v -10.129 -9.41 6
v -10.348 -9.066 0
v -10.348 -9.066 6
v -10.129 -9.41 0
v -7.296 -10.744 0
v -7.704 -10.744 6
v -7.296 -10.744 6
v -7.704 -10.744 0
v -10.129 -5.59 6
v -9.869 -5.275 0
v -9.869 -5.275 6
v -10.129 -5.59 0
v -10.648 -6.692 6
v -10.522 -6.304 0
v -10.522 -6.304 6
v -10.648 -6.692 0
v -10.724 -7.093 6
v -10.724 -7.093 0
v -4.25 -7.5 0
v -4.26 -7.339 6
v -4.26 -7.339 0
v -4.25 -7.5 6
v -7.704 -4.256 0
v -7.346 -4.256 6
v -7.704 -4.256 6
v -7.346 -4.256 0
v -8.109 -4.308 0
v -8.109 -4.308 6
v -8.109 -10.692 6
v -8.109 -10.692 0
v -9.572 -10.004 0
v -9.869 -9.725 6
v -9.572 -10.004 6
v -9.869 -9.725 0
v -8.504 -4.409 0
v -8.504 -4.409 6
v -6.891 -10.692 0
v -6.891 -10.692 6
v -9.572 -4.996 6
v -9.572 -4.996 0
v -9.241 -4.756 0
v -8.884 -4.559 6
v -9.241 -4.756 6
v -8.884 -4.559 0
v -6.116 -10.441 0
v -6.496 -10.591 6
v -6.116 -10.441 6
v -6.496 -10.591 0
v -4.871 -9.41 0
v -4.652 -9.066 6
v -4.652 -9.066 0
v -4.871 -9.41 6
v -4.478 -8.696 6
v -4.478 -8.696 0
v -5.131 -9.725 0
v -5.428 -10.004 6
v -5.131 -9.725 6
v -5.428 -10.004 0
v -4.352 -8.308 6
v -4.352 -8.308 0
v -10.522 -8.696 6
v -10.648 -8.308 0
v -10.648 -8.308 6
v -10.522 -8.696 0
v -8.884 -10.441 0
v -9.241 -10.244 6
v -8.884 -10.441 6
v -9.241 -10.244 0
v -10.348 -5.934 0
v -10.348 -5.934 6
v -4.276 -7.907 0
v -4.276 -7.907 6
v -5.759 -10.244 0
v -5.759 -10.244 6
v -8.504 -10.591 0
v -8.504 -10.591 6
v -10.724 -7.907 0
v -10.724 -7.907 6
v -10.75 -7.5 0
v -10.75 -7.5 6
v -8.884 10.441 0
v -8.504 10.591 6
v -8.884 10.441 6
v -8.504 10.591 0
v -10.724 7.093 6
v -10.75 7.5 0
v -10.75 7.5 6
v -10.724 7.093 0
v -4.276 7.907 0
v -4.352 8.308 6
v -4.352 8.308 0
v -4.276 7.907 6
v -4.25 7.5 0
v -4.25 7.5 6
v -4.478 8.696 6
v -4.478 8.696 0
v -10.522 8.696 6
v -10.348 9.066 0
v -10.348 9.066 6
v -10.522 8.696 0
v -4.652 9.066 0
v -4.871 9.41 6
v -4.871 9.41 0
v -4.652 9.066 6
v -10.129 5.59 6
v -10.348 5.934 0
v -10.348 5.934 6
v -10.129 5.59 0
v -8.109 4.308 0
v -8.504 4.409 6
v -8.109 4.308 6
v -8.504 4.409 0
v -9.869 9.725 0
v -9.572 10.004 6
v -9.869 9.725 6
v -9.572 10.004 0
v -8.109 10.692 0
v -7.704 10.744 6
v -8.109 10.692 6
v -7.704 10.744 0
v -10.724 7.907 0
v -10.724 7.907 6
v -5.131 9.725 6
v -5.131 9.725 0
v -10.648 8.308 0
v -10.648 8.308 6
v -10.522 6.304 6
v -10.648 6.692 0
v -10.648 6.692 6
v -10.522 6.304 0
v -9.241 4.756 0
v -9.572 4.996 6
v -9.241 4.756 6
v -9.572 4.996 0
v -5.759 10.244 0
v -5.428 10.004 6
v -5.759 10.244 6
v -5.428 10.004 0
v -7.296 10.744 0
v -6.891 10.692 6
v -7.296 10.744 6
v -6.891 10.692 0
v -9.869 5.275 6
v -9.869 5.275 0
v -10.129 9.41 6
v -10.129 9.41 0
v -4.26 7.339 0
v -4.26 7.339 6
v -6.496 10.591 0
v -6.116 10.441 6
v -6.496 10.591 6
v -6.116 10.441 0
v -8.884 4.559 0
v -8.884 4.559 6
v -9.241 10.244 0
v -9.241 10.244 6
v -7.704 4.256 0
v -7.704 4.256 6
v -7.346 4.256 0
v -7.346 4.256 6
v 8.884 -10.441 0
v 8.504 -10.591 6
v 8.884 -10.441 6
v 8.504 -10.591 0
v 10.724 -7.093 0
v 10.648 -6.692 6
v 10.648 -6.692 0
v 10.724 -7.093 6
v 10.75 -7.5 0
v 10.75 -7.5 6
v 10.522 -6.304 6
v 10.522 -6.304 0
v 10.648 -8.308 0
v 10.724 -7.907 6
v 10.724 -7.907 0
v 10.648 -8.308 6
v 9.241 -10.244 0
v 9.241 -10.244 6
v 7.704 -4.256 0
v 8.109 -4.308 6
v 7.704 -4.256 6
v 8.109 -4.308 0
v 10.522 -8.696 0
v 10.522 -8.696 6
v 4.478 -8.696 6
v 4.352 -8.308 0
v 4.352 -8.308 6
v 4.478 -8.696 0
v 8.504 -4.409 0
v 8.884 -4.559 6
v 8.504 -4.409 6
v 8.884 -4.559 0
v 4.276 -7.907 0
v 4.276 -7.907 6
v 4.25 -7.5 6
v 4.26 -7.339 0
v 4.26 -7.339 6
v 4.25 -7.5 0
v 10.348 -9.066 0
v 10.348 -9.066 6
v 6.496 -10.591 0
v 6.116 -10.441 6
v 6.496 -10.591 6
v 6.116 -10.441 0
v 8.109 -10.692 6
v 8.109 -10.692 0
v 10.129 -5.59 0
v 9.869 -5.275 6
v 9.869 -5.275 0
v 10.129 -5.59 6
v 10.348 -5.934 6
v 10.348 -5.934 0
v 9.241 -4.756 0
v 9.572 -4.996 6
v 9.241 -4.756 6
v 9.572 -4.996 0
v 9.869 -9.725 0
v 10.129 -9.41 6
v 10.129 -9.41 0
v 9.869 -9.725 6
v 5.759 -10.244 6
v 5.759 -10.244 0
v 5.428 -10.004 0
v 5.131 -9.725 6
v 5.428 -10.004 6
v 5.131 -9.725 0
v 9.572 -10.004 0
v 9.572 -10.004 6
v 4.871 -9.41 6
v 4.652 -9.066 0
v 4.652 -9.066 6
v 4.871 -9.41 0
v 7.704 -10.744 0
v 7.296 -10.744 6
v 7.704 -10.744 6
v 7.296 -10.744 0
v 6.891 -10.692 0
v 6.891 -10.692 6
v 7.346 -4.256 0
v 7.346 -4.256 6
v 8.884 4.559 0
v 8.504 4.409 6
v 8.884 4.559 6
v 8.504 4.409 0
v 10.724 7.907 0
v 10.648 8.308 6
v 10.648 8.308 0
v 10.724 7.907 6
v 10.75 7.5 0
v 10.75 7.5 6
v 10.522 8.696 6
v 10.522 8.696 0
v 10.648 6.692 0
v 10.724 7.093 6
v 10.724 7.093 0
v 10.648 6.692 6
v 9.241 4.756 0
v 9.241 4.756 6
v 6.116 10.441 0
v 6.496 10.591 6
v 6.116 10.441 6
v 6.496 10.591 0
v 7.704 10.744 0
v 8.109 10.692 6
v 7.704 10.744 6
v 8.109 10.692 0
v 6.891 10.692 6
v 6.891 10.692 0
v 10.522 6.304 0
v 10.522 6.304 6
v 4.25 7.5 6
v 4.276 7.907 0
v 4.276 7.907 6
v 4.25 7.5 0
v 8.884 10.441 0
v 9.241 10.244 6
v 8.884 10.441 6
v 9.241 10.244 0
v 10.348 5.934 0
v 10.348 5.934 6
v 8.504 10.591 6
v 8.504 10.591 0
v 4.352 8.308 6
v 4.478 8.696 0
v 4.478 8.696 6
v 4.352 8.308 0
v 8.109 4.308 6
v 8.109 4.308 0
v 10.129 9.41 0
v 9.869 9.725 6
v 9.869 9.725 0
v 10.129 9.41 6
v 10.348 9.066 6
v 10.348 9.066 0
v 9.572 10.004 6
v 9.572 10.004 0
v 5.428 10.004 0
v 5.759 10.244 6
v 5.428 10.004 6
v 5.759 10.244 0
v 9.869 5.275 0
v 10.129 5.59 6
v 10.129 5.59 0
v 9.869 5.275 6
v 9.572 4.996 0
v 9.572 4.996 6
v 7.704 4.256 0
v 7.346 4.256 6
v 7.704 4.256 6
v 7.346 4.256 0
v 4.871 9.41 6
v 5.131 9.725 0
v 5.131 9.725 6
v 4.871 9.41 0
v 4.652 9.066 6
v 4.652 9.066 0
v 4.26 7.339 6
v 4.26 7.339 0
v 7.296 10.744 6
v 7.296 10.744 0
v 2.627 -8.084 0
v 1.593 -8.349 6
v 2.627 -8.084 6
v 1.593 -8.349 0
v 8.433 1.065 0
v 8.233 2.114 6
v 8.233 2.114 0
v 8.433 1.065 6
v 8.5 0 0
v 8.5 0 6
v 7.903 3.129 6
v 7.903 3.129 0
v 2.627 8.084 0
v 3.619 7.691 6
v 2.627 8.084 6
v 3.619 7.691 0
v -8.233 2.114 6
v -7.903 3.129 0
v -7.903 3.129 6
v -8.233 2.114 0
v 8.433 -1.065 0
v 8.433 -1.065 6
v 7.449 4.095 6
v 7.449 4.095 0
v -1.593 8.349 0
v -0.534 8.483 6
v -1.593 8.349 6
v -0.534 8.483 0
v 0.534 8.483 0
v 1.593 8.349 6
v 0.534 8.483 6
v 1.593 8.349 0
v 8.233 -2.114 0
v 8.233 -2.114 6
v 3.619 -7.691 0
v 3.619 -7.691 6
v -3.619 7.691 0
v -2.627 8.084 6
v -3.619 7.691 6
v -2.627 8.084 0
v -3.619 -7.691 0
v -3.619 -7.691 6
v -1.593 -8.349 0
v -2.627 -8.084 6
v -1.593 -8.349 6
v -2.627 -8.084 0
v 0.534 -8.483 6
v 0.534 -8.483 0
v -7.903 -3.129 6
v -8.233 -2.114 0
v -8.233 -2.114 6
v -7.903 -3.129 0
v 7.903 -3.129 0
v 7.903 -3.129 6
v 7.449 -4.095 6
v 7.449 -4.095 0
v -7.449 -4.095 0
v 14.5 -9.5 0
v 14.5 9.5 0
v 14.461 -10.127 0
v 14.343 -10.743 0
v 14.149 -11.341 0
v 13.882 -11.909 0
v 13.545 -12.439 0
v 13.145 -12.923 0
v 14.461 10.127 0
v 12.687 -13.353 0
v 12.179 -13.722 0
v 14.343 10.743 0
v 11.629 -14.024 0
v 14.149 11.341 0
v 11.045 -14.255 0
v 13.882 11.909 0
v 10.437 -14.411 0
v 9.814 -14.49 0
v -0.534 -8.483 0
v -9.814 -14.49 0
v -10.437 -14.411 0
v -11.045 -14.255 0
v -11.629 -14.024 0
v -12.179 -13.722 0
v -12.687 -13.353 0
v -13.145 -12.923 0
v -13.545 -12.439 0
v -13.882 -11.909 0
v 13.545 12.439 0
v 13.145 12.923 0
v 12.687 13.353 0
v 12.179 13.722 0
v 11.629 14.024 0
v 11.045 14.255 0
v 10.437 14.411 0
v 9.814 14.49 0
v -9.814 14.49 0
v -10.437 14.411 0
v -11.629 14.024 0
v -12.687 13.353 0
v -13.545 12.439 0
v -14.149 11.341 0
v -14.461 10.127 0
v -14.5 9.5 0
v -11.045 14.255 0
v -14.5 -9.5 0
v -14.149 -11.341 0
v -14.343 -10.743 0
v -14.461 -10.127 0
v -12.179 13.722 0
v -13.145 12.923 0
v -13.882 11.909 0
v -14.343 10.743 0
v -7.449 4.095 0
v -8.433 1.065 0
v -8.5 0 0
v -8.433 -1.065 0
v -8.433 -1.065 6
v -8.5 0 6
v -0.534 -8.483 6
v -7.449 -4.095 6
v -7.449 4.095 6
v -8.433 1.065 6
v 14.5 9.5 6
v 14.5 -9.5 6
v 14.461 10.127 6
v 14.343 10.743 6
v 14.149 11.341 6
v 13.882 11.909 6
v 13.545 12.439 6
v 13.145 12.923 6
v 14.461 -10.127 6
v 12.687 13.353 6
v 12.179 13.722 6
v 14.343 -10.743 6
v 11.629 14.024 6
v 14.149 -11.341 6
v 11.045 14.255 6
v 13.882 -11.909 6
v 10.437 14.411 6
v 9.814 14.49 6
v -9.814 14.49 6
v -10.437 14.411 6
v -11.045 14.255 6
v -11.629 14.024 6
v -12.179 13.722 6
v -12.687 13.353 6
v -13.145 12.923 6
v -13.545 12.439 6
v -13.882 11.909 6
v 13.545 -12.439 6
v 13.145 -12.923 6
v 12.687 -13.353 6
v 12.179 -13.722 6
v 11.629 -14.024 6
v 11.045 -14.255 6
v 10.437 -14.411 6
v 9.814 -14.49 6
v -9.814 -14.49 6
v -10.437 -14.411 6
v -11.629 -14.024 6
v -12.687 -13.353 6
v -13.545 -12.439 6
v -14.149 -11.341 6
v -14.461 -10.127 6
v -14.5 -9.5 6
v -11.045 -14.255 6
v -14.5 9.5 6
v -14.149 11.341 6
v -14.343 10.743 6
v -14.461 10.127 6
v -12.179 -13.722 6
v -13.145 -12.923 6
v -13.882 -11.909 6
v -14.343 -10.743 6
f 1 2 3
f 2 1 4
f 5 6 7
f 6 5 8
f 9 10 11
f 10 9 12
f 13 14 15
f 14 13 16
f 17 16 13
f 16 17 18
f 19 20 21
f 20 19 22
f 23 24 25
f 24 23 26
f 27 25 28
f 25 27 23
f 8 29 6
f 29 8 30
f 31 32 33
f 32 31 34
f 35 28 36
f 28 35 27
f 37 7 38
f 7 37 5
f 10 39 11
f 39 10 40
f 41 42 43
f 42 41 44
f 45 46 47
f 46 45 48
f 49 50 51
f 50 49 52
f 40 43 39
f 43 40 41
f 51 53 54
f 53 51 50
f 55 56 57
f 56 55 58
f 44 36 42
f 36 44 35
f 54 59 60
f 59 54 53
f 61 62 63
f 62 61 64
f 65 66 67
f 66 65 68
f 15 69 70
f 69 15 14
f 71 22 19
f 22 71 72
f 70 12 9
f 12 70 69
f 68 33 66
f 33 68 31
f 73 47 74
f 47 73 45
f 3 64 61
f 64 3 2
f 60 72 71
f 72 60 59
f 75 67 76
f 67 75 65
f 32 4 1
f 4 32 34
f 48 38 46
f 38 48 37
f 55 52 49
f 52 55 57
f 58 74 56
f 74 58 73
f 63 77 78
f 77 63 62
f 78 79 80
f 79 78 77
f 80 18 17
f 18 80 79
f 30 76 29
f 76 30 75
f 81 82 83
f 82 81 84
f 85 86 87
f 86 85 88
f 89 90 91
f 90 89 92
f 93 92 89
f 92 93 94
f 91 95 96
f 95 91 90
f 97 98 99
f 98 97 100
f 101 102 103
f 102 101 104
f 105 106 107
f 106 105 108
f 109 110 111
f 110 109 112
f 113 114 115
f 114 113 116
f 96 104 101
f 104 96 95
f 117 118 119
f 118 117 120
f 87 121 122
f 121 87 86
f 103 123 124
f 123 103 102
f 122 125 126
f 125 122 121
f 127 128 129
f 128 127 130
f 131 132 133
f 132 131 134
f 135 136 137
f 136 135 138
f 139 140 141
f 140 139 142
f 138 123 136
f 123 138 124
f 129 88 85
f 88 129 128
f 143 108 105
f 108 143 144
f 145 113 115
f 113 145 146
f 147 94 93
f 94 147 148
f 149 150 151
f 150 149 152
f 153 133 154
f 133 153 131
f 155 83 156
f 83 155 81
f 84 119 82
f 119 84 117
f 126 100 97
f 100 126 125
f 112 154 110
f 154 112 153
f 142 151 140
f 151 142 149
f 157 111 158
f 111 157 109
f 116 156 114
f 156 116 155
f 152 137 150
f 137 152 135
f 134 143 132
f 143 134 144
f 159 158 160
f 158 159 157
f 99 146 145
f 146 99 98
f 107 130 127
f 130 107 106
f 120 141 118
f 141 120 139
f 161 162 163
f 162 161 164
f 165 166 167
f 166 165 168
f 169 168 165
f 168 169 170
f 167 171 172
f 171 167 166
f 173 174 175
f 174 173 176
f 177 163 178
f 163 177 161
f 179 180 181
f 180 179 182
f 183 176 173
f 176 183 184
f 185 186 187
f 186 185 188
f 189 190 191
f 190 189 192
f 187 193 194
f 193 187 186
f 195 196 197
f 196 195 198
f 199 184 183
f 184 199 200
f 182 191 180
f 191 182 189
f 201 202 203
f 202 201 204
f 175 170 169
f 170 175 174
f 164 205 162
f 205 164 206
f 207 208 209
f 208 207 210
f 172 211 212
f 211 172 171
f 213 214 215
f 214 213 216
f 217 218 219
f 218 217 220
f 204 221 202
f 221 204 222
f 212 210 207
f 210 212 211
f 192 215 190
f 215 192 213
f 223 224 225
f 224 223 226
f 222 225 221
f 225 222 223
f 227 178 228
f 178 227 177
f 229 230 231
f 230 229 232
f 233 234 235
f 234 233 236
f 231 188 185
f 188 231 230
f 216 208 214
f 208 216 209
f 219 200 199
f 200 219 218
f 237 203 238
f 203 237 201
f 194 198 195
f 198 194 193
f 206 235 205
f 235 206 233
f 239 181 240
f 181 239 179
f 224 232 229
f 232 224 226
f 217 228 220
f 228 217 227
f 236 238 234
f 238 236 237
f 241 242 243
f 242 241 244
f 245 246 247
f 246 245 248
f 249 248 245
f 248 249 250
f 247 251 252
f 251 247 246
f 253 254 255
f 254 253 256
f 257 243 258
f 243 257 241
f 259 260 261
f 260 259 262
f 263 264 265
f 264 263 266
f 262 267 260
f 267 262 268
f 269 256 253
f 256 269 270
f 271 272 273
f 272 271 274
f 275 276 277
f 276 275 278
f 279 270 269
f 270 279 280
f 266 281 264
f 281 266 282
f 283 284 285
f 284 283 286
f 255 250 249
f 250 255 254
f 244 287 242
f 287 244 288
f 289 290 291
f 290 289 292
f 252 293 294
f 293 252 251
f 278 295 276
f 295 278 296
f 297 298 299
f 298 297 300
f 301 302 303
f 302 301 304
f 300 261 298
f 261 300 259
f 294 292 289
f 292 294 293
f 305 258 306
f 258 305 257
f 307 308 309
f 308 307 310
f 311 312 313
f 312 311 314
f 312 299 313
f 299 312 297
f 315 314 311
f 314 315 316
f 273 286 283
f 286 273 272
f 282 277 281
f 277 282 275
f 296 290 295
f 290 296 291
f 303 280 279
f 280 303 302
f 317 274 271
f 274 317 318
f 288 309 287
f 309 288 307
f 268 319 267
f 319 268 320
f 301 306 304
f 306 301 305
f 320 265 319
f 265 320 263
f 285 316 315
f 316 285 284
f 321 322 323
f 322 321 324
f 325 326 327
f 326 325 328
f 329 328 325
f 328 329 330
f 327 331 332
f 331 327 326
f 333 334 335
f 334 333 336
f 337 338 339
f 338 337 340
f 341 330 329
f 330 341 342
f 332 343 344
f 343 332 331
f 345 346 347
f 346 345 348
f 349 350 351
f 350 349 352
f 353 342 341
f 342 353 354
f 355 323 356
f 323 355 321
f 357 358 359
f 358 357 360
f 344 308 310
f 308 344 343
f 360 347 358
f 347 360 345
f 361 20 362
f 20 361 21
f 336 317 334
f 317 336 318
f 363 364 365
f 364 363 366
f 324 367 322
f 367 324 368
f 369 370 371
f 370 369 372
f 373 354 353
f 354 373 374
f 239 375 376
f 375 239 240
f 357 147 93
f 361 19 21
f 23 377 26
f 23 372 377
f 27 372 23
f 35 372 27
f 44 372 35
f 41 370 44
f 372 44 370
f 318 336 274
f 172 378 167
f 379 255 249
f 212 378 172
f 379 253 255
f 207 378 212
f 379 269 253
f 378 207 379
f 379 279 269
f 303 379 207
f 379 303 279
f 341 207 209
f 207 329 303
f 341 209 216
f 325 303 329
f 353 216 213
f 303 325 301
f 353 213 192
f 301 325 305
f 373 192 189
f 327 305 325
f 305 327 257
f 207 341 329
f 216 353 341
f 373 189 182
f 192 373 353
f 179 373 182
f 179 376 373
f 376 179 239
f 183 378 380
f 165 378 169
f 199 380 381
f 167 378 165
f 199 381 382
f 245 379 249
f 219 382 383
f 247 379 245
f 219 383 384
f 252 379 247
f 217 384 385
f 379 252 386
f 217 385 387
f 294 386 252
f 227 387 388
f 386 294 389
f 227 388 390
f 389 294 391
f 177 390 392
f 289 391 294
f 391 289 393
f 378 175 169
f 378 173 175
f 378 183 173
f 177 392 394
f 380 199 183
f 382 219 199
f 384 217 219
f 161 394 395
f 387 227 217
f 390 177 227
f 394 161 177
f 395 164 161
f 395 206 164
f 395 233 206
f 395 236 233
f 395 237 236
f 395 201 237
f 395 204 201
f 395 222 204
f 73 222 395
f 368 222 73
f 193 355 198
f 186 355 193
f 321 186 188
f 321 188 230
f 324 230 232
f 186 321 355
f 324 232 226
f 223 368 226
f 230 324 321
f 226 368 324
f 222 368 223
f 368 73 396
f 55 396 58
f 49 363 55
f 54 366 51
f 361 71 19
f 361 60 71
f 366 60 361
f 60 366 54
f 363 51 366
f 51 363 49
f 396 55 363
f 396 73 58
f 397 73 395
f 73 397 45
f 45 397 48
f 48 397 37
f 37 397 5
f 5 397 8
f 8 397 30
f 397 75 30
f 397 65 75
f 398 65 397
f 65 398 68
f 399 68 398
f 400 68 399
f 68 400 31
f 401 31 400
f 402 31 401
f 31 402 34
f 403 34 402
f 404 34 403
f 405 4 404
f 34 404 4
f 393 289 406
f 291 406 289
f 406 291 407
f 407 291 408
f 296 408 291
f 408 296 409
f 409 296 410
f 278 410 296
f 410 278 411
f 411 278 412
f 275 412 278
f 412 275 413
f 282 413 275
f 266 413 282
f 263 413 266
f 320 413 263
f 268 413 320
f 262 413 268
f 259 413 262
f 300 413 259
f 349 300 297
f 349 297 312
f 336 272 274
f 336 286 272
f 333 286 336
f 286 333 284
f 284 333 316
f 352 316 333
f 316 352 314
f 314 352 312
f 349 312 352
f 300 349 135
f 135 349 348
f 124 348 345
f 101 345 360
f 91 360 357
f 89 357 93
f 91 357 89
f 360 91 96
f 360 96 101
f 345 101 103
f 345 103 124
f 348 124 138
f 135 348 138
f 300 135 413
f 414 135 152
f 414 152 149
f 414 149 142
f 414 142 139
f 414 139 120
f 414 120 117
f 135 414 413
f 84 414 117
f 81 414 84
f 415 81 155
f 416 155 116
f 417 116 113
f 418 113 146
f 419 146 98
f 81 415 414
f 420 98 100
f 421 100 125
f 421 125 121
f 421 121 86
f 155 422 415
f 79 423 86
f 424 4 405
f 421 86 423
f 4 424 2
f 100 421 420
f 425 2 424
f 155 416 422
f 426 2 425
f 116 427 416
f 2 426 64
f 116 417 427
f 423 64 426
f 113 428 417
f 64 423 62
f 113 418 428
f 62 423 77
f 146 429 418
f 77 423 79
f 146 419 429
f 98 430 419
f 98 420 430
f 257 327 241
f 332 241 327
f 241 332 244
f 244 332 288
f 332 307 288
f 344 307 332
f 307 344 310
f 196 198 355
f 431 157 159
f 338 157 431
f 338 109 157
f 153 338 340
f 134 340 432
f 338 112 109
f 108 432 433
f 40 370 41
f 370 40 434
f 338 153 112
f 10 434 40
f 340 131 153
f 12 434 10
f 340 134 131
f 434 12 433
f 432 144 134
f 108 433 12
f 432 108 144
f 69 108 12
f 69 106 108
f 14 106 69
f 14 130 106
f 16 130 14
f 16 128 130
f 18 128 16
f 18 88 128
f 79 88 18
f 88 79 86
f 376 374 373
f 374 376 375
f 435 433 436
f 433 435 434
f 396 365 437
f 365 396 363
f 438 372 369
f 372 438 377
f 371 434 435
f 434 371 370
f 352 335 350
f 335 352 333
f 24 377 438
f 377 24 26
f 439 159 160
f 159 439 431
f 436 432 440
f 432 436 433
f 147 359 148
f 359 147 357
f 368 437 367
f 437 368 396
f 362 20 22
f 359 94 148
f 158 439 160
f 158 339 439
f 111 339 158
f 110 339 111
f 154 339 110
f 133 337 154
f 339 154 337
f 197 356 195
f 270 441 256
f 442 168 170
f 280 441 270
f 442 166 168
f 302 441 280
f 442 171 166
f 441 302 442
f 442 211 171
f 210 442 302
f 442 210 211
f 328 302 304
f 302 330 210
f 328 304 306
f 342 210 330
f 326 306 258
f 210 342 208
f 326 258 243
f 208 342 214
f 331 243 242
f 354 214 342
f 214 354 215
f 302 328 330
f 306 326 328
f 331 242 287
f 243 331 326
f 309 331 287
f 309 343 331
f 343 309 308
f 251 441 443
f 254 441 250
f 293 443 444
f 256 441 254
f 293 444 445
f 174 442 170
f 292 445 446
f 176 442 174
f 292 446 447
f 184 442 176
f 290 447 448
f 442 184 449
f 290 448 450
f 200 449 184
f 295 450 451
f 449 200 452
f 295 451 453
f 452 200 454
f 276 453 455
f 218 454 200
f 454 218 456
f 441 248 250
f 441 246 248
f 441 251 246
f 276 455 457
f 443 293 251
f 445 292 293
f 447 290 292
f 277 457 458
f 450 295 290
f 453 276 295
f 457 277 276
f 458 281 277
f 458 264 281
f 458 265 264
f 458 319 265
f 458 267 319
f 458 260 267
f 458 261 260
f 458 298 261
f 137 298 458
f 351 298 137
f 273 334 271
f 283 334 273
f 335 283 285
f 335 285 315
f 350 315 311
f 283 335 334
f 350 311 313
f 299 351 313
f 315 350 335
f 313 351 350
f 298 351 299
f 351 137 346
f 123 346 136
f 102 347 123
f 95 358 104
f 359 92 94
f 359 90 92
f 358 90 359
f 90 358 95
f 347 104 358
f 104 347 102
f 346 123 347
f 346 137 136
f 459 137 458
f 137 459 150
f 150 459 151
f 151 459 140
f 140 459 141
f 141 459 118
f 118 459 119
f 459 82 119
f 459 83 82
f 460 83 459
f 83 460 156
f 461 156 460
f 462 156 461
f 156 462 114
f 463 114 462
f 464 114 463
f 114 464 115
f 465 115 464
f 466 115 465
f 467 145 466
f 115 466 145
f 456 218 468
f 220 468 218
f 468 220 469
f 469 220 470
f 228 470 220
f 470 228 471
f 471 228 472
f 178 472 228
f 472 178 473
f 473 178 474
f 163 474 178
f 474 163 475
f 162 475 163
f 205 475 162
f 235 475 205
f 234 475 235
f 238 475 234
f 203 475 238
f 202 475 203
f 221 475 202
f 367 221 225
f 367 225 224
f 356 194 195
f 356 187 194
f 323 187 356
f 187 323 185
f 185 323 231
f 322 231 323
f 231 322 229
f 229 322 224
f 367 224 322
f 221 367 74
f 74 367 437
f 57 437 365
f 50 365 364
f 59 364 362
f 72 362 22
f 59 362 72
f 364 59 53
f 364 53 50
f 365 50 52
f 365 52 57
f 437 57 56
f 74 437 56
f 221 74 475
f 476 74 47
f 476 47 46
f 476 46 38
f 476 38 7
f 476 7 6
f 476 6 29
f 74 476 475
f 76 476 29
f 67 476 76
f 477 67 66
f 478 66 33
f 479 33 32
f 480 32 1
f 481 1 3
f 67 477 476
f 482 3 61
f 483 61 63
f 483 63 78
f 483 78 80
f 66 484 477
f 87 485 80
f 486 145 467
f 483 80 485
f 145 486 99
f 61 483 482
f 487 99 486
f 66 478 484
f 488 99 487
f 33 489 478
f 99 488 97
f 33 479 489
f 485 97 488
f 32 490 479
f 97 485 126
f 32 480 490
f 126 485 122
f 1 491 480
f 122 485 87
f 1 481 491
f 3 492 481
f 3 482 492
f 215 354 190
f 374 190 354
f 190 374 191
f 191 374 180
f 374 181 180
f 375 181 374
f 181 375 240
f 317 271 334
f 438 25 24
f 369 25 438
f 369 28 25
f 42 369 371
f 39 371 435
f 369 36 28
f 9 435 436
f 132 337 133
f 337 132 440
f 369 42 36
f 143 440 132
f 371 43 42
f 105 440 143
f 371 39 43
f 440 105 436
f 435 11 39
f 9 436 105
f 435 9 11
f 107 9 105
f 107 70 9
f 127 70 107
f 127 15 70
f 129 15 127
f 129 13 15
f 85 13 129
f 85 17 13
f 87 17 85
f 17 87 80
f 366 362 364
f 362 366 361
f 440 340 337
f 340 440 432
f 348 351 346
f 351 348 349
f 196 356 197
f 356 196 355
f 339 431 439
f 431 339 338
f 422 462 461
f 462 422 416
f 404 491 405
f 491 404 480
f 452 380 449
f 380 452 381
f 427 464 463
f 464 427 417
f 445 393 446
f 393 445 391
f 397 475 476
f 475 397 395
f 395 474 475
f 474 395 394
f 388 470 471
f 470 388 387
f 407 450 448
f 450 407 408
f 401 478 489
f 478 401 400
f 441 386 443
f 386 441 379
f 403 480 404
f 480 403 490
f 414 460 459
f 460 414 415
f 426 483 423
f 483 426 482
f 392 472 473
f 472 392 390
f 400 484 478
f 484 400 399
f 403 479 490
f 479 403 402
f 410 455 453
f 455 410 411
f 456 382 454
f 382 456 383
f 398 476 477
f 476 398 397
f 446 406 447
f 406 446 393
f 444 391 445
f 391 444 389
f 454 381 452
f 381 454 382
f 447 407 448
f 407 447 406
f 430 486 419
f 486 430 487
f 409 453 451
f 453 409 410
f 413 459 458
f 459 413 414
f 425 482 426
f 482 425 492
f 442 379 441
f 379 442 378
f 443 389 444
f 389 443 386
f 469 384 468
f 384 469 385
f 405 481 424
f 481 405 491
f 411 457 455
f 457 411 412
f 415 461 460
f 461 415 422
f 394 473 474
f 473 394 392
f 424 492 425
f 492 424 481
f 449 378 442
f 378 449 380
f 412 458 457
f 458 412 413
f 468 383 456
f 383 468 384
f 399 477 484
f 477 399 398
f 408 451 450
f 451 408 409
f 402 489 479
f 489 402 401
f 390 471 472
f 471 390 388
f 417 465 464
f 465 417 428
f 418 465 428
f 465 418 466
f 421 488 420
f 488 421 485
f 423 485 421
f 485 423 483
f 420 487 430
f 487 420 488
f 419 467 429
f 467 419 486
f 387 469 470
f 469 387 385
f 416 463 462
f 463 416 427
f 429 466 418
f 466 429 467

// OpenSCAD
$fn = 50;


difference() {
	union() {
		hull() {
			translate(v = [-9.5000000000, 9.5000000000, 0]) {
				cylinder(h = 6, r = 5);
			}
			translate(v = [9.5000000000, 9.5000000000, 0]) {
				cylinder(h = 6, r = 5);
			}
			translate(v = [-9.5000000000, -9.5000000000, 0]) {
				cylinder(h = 6, r = 5);
			}
			translate(v = [9.5000000000, -9.5000000000, 0]) {
				cylinder(h = 6, r = 5);
			}
		}
	}
	union() {
		#translate(v = [-7.5000000000, -7.5000000000, -100.0000000000]) {
			cylinder(h = 200, r = 3.2500000000);
		}
		#translate(v = [-7.5000000000, 7.5000000000, -100.0000000000]) {
			cylinder(h = 200, r = 3.2500000000);
		}
		#translate(v = [7.5000000000, -7.5000000000, -100.0000000000]) {
			cylinder(h = 200, r = 3.2500000000);
		}
		#translate(v = [7.5000000000, 7.5000000000, -100.0000000000]) {
			cylinder(h = 200, r = 3.2500000000);
		}
		#cylinder(h = 6, r = 8.5000000000);
	}
}
